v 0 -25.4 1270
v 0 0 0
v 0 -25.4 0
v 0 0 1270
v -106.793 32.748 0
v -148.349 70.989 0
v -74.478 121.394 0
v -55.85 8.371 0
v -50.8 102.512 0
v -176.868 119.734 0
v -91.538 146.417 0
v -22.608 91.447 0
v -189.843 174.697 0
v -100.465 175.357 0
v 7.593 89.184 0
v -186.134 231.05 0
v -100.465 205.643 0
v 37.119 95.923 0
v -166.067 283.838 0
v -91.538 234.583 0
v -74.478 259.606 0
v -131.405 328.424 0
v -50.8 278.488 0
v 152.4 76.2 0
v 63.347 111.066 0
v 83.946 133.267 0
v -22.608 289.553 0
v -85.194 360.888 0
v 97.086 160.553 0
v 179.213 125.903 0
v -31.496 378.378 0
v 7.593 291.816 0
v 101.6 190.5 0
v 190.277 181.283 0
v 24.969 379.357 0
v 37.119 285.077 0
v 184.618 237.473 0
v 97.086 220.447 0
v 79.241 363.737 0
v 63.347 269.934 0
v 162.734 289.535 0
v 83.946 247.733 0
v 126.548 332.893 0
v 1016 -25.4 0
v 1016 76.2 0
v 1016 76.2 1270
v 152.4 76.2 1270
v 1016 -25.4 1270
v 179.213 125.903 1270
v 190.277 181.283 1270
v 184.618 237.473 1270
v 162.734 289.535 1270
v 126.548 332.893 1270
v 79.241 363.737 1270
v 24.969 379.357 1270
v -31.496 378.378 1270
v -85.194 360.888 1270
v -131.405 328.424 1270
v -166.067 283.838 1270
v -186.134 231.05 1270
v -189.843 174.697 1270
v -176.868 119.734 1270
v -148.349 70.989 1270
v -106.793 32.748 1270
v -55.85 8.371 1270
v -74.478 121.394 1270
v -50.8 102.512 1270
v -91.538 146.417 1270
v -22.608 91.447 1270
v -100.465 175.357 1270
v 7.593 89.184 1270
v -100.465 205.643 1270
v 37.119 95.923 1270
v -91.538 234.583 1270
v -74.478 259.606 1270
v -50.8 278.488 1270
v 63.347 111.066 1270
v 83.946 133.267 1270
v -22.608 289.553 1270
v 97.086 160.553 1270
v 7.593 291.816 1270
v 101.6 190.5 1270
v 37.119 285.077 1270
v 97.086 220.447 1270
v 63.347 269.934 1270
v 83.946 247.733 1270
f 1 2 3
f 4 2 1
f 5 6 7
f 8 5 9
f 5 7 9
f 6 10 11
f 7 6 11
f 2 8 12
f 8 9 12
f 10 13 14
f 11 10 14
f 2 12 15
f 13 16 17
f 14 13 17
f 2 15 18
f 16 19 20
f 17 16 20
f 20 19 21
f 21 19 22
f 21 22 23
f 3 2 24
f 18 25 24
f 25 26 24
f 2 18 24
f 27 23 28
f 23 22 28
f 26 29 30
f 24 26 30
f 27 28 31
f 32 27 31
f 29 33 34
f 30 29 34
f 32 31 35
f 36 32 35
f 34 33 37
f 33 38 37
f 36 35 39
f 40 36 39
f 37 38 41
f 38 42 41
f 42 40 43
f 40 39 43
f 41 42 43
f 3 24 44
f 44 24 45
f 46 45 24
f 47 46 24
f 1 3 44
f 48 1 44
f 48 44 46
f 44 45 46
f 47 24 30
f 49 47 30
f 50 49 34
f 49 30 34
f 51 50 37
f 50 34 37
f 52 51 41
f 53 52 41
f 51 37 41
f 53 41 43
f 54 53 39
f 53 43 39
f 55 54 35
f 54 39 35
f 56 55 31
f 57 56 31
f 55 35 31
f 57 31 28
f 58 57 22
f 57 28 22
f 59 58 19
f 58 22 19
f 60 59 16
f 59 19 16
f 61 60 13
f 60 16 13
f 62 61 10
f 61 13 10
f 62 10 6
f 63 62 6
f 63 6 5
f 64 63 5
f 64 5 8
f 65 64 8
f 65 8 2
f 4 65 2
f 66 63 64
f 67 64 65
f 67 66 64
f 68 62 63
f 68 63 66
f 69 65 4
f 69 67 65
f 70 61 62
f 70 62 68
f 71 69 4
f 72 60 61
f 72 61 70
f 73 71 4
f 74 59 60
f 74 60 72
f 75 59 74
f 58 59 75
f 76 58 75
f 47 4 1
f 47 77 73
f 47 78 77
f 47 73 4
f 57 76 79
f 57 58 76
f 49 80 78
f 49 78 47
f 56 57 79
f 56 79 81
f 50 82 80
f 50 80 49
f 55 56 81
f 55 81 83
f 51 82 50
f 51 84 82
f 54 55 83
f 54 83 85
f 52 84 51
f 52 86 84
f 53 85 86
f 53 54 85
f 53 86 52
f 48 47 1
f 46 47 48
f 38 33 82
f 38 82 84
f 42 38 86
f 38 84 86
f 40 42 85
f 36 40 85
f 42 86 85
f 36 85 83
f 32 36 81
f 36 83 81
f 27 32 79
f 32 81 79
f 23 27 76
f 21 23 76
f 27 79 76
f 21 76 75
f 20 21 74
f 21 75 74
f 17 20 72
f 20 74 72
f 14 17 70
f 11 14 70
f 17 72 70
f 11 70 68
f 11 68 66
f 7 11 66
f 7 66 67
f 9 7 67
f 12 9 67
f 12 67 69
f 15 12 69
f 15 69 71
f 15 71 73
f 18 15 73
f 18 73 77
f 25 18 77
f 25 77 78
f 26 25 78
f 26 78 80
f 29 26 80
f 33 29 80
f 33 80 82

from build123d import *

# Parameters (mm, degrees)
F1_DEPTH = 1270
F2_R     = 101.6
F3_DEPTH = 1270.001
F4_DEPTH = 25.4


with BuildPart() as f1:
    # F0 (on Top) → F1 (new body)
    with BuildSketch(Plane.XY):
        with BuildLine():
            ThreePointArc((152.4, 76.2), (-85.1941899427, 360.8883798855), (0, 0))
            Line((0, 0), (1016, 0))
            Line((1016, 0), (1016, 76.2))
            Line((1016, 76.2), (152.4, 76.2))
        make_face()
    extrude(amount=F1_DEPTH)

    # F2 (on face) → F3 (cut, through all)
    with BuildSketch(Plane.XY.offset(1270)):
        with Locations((0, 190.5)):
            Circle(F2_R)
    extrude(amount=-F3_DEPTH, mode=Mode.SUBTRACT)

    # F4 (add): a face of the model
    f4_faces = [f1.faces().sort_by_distance(p)[0] for p in [
        (508, 0, 635),
    ]]
    extrude(f4_faces, amount=F4_DEPTH)


solid = f1.part
